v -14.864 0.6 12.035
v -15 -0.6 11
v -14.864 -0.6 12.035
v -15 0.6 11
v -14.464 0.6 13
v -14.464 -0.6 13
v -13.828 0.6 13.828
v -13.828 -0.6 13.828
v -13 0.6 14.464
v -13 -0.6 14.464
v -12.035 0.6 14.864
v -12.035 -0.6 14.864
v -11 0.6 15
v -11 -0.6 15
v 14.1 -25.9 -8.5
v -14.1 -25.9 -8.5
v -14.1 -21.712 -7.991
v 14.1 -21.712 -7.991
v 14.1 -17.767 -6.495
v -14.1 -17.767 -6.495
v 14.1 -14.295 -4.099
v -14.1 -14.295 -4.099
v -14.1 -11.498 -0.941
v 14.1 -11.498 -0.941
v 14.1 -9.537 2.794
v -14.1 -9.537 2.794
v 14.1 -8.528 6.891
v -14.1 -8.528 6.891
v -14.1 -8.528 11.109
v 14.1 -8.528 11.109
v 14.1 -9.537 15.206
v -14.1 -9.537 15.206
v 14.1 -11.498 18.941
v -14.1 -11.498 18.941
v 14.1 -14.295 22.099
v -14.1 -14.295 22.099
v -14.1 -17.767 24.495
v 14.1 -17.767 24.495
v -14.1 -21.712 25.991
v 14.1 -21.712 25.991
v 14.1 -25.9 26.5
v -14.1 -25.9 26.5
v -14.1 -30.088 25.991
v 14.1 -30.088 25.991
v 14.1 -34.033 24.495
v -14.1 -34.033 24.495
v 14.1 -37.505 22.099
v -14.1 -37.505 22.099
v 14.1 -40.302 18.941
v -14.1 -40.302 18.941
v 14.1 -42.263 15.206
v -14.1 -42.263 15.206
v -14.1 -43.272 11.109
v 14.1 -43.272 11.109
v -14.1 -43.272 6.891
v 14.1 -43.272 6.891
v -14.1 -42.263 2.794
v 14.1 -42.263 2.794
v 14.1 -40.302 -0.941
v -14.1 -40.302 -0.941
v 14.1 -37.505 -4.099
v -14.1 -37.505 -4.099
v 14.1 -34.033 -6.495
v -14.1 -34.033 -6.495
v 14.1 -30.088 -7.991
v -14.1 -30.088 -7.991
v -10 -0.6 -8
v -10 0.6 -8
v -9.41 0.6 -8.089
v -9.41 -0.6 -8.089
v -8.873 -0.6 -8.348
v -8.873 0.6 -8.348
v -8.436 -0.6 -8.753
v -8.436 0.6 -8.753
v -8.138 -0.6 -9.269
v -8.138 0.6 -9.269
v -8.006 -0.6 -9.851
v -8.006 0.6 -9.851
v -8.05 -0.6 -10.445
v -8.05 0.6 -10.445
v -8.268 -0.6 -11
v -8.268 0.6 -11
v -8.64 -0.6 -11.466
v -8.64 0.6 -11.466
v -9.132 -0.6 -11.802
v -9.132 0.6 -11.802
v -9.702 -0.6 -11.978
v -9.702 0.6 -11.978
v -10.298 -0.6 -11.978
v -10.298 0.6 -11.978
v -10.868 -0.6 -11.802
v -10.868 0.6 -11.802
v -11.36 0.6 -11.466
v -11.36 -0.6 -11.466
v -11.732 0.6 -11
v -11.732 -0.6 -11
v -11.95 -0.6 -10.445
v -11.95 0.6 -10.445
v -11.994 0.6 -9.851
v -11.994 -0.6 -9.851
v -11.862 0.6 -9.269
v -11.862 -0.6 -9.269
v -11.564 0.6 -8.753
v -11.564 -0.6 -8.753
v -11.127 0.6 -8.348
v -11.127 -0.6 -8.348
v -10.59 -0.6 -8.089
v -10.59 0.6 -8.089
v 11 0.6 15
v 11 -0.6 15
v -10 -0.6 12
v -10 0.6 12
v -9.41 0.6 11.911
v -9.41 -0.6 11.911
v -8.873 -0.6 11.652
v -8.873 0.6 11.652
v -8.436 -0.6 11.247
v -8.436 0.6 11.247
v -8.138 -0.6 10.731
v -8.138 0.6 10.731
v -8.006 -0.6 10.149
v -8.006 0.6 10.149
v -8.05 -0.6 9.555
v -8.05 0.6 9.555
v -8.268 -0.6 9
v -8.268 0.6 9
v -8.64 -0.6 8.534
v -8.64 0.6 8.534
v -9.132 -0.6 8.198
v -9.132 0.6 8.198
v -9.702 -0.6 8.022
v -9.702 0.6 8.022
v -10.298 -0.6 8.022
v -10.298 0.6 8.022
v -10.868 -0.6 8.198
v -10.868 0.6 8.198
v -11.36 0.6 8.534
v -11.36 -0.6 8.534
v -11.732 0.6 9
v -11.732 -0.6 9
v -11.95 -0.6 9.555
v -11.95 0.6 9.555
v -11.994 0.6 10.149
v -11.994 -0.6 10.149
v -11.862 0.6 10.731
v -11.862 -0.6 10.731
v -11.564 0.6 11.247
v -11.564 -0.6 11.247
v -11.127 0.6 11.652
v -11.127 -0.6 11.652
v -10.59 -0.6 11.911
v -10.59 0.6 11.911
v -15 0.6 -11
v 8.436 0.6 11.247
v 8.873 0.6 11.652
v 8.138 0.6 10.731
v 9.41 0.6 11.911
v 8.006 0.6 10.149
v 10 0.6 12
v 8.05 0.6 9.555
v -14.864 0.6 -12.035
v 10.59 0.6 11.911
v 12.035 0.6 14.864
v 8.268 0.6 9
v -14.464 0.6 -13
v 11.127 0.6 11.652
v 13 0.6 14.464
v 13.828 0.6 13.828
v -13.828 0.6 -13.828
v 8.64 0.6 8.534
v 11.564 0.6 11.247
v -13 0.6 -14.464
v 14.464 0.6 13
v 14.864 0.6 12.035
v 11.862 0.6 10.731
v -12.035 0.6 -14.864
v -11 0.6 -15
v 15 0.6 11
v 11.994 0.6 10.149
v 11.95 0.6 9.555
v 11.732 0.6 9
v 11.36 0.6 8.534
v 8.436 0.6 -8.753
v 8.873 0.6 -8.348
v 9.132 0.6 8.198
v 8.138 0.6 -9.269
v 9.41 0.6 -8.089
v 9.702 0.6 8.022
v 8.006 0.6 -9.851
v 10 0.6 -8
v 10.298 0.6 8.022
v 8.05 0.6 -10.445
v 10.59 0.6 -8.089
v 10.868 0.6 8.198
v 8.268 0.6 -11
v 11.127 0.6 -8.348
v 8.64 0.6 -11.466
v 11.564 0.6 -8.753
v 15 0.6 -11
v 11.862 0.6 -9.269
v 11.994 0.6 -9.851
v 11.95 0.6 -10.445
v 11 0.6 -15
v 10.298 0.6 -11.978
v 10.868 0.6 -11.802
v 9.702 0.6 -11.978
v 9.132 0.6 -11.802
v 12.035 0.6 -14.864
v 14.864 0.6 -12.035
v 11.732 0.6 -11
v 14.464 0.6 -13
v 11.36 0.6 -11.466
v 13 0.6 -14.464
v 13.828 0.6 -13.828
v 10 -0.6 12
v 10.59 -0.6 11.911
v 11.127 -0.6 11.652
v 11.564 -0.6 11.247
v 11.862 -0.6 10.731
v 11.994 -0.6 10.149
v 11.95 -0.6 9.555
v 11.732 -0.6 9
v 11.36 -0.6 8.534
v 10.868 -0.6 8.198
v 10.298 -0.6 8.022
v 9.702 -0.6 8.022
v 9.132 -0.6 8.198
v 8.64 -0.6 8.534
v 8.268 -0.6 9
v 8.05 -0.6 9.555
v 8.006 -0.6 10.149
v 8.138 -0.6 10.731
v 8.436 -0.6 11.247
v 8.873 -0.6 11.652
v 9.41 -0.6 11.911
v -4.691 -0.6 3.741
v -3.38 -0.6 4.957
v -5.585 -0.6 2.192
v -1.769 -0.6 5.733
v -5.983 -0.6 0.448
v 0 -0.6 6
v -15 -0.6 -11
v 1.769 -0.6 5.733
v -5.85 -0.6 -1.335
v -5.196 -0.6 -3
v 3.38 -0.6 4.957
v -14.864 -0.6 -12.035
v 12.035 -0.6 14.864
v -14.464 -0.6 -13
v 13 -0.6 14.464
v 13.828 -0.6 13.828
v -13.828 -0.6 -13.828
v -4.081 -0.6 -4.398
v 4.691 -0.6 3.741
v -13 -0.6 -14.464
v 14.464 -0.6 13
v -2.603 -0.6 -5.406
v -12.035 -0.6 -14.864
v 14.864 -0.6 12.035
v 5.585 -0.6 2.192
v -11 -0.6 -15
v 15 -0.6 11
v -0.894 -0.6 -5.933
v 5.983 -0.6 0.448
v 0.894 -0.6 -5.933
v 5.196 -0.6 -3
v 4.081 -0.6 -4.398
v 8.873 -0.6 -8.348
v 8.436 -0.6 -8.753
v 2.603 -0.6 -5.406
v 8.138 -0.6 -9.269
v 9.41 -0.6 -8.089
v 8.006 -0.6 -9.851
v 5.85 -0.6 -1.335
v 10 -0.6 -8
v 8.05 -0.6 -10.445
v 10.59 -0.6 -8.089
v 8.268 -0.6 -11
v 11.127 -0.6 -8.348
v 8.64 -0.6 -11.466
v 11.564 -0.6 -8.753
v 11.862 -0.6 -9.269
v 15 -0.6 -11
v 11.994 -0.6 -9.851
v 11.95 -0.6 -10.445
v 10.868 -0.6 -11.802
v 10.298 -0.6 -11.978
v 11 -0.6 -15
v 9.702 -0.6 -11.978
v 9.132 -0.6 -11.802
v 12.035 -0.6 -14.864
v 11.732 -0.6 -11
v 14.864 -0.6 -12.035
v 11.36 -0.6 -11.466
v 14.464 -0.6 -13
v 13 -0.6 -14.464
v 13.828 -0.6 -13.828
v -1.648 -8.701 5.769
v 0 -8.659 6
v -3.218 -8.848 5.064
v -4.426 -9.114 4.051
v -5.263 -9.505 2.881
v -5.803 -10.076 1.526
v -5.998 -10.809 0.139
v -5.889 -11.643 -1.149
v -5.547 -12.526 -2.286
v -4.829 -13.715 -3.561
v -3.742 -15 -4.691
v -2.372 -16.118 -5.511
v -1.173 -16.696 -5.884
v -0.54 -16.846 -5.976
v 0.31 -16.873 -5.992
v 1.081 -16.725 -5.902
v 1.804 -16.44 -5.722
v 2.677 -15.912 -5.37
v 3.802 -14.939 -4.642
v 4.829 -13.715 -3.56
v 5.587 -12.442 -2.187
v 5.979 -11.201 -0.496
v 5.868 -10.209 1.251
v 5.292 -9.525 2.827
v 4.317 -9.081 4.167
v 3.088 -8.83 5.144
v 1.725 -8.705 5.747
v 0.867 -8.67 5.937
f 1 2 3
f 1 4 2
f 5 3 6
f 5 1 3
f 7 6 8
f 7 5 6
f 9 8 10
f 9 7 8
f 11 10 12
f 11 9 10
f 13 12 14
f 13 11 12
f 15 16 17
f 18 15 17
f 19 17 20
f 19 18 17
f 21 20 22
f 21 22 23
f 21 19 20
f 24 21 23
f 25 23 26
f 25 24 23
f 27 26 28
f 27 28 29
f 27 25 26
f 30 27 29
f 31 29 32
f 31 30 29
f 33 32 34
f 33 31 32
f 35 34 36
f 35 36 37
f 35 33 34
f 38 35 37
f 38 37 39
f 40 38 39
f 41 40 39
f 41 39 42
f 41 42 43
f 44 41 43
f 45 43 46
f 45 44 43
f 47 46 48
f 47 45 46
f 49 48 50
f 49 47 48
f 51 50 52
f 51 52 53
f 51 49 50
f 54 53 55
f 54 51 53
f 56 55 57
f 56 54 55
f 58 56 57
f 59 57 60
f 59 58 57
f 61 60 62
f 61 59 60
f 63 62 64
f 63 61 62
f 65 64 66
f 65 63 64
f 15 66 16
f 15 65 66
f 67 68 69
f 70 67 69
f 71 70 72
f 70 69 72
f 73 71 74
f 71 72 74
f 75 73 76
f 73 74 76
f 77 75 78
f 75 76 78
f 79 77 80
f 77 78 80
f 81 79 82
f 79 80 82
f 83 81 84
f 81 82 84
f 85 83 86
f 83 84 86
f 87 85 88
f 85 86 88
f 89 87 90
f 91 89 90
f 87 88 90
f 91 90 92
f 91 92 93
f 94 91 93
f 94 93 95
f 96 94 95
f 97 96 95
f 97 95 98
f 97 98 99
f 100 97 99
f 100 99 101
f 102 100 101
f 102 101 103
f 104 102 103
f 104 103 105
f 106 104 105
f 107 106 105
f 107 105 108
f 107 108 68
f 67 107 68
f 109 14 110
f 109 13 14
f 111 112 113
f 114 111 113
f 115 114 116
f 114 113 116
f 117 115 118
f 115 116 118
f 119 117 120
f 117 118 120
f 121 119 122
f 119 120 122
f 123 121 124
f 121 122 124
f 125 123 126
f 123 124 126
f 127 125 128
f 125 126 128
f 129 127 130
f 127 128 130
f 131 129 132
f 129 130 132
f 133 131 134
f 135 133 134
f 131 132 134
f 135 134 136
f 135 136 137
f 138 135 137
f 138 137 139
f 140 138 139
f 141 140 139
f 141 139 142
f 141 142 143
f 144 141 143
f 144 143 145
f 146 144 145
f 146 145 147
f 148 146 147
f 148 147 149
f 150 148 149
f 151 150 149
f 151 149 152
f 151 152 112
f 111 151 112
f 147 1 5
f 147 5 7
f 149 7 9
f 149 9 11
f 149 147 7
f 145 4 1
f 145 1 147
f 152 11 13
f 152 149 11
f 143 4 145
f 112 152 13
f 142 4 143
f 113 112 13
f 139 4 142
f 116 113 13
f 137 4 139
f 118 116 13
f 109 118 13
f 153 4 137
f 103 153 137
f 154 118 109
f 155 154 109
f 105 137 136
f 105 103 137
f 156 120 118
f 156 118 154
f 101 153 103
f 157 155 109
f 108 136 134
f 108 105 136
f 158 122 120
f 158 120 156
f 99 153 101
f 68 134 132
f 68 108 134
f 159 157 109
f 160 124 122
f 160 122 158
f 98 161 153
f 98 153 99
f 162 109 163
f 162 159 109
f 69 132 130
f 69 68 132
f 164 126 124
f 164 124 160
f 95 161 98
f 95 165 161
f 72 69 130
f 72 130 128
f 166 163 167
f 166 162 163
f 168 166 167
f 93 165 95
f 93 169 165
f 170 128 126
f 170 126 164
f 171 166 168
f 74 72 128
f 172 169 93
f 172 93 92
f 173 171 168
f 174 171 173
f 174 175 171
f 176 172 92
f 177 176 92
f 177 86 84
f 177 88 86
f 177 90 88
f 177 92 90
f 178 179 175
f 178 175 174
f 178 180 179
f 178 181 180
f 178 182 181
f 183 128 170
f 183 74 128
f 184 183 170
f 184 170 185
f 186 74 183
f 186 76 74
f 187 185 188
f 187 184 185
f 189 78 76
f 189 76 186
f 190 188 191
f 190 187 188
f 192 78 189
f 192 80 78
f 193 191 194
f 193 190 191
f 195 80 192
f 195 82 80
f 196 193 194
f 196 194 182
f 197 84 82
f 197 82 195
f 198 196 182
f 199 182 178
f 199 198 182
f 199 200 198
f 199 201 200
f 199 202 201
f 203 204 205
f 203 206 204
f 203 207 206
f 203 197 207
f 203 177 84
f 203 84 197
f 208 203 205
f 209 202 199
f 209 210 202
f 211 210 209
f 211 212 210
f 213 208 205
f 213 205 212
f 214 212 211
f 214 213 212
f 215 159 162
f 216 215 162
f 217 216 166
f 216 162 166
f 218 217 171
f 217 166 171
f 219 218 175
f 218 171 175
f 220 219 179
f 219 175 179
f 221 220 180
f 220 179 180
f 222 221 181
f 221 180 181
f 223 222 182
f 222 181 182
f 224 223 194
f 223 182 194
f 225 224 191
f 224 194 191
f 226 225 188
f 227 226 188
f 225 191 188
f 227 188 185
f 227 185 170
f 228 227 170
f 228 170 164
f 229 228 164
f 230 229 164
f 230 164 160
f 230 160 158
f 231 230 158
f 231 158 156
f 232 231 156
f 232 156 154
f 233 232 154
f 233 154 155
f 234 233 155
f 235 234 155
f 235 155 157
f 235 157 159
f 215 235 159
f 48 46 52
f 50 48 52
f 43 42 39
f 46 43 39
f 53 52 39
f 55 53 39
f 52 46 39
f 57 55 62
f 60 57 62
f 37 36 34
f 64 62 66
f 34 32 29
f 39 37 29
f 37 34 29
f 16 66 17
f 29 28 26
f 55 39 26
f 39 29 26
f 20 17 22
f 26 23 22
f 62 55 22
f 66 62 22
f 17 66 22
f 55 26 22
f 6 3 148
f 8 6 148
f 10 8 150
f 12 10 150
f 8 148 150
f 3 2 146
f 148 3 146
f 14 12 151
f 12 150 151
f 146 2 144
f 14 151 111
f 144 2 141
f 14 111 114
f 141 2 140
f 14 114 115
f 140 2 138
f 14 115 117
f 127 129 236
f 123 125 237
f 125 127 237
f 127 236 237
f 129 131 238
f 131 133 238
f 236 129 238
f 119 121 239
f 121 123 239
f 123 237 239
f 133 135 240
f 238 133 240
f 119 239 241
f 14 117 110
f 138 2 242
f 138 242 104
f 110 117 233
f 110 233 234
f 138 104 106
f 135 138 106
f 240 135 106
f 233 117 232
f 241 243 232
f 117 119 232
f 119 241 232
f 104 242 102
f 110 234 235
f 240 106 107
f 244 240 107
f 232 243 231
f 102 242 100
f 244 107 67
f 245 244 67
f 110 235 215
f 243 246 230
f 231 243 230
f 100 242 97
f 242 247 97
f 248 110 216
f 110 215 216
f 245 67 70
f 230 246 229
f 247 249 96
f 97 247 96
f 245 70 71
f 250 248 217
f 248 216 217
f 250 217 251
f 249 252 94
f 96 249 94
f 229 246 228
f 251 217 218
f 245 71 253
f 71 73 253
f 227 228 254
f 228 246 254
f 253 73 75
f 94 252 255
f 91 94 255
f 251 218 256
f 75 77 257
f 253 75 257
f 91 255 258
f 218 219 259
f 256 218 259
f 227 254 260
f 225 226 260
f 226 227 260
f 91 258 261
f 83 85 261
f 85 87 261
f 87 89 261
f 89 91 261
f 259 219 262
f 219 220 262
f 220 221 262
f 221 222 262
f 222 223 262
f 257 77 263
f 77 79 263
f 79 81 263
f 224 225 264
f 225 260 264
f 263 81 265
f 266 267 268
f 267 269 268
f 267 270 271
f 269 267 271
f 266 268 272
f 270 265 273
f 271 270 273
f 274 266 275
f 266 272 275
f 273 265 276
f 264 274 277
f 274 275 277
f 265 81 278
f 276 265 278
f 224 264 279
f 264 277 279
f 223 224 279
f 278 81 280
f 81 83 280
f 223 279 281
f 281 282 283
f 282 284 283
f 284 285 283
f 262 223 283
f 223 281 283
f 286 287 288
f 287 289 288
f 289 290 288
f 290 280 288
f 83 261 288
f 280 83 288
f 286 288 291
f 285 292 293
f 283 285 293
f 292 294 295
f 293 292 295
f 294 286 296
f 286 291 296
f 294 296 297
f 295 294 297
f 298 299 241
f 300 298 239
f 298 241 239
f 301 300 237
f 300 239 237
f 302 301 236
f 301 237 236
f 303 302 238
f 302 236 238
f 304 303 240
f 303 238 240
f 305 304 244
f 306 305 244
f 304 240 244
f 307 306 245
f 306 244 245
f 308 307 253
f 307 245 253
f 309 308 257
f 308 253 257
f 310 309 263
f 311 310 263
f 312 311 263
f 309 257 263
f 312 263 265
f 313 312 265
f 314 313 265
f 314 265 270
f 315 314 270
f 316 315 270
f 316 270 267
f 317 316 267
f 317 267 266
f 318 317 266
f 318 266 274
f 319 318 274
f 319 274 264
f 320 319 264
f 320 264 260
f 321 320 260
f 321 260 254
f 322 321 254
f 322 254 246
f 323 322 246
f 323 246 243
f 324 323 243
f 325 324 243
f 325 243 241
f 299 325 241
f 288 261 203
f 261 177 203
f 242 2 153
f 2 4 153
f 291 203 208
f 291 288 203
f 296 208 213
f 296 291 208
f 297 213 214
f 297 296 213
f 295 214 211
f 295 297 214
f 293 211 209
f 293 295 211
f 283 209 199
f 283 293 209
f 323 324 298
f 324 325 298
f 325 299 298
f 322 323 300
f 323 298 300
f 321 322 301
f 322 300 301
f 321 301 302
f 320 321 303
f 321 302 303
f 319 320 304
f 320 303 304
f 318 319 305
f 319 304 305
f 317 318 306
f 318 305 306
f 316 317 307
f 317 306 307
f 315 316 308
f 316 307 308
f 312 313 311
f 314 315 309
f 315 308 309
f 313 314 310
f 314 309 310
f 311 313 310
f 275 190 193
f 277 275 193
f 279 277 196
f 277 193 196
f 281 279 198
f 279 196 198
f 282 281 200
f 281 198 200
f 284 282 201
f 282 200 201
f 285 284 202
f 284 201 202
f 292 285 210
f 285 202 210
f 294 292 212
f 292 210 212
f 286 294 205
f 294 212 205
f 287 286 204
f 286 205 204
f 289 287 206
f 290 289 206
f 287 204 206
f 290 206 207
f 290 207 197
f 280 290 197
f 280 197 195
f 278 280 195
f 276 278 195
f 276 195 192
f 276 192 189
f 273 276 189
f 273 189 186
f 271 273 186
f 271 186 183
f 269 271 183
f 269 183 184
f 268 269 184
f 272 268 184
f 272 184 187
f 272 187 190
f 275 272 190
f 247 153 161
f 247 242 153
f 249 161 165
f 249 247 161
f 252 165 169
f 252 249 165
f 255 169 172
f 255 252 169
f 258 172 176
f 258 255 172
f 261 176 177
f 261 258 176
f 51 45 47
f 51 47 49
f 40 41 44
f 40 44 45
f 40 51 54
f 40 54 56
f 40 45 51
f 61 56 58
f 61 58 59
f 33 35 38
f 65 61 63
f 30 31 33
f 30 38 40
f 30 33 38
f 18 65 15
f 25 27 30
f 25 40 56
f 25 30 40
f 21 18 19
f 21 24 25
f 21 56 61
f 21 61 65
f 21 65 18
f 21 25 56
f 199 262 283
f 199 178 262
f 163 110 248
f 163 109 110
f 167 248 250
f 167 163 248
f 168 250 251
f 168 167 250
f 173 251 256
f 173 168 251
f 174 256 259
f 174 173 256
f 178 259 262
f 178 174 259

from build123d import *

# Parameters (mm, degrees)
SKETCH_1_W              = 30
SKETCH_1_H              = 30
EXTRUDE_401_DEPTH       = 0.6
SKETCH_7_R              = 2
CUT_EXTRUDE_589_DEPTH   = 22.247117452
FILLET_4_R              = 4
SKETCH_9_R              = 17.5
EXTRUDE_963_DEPTH       = 14.1
EXTRUDE_1165_REACH      = 54.527
EXTRUDE_1165_END_RADIUS = 17.5
SKETCH_8_R              = 6


with BuildPart() as part:
    # Эскиз1 → Extrude 401 (new, symmetric)
    with BuildSketch(Plane(origin=(0, 0, 0), x_dir=(1, 0, 0), z_dir=(0, 1, 0))):
        Rectangle(SKETCH_1_W, SKETCH_1_H)
    extrude(amount=EXTRUDE_401_DEPTH, both=True)

    # Эскиз7 → Cut-Extrude 589 (cut, through all)
    with BuildSketch(Plane(origin=(0, 0.6, 0), x_dir=(1, 0, 0), z_dir=(0, 1, 0))):
        with Locations(Location((-10, 10, 0), (0, 0, 270))):
            Circle(SKETCH_7_R)
        with Locations(Location((10, 10, 0), (0, 0, 270))):
            Circle(SKETCH_7_R)
        with Locations(Location((10, -10, 0), (0, 0, 270))):
            Circle(SKETCH_7_R)
        with Locations(Location((-10, -10, 0), (0, 0, 270))):
            Circle(SKETCH_7_R)
    extrude(amount=-CUT_EXTRUDE_589_DEPTH, mode=Mode.SUBTRACT)

    # Скругление4
    fillet_4_edges = [part.edges().sort_by_distance(p)[0] for p in [
        (15, 0, 15),
        (-15, 0, 15),
        (-15, 0, -15),
        (15, 0, -15),
    ]]
    fillet(fillet_4_edges, radius=FILLET_4_R)

    # Extrude 1165: up to this cylinder (the profile starts outside it)
    extrude_1165_end = Plane(origin=(0, -25.9, 9), z_dir=(-1, 0, 0)) * Cylinder(EXTRUDE_1165_END_RADIUS, 145.054, mode=Mode.PRIVATE)
    # Эскиз8 → Extrude 1165 (add, up to the surface)
    with BuildSketch(Plane.XZ.offset(0.6), mode=Mode.PRIVATE) as extrude_1165_sk1:
        with Locations(Location((0, 0, 0), (0, 0, 90))):
            Circle(SKETCH_8_R)
    extrude_1165_tool1 = extrude(extrude_1165_sk1.sketch, amount=EXTRUDE_1165_REACH, mode=Mode.PRIVATE) - extrude_1165_end
    add(extrude_1165_tool1.solids().sort_by_distance((0, -0.6, 0))[0])


with BuildPart() as body_2:
    # Эскиз9 → Extrude 963 (new, symmetric)
    with BuildSketch(Plane(origin=(0, 0, 0), x_dir=(0, 0, -1), z_dir=(1, 0, 0))):
        with Locations((-9, -25.9)):
            Circle(SKETCH_9_R)
    extrude(amount=EXTRUDE_963_DEPTH, both=True)


solid = Compound([part.part, body_2.part])
